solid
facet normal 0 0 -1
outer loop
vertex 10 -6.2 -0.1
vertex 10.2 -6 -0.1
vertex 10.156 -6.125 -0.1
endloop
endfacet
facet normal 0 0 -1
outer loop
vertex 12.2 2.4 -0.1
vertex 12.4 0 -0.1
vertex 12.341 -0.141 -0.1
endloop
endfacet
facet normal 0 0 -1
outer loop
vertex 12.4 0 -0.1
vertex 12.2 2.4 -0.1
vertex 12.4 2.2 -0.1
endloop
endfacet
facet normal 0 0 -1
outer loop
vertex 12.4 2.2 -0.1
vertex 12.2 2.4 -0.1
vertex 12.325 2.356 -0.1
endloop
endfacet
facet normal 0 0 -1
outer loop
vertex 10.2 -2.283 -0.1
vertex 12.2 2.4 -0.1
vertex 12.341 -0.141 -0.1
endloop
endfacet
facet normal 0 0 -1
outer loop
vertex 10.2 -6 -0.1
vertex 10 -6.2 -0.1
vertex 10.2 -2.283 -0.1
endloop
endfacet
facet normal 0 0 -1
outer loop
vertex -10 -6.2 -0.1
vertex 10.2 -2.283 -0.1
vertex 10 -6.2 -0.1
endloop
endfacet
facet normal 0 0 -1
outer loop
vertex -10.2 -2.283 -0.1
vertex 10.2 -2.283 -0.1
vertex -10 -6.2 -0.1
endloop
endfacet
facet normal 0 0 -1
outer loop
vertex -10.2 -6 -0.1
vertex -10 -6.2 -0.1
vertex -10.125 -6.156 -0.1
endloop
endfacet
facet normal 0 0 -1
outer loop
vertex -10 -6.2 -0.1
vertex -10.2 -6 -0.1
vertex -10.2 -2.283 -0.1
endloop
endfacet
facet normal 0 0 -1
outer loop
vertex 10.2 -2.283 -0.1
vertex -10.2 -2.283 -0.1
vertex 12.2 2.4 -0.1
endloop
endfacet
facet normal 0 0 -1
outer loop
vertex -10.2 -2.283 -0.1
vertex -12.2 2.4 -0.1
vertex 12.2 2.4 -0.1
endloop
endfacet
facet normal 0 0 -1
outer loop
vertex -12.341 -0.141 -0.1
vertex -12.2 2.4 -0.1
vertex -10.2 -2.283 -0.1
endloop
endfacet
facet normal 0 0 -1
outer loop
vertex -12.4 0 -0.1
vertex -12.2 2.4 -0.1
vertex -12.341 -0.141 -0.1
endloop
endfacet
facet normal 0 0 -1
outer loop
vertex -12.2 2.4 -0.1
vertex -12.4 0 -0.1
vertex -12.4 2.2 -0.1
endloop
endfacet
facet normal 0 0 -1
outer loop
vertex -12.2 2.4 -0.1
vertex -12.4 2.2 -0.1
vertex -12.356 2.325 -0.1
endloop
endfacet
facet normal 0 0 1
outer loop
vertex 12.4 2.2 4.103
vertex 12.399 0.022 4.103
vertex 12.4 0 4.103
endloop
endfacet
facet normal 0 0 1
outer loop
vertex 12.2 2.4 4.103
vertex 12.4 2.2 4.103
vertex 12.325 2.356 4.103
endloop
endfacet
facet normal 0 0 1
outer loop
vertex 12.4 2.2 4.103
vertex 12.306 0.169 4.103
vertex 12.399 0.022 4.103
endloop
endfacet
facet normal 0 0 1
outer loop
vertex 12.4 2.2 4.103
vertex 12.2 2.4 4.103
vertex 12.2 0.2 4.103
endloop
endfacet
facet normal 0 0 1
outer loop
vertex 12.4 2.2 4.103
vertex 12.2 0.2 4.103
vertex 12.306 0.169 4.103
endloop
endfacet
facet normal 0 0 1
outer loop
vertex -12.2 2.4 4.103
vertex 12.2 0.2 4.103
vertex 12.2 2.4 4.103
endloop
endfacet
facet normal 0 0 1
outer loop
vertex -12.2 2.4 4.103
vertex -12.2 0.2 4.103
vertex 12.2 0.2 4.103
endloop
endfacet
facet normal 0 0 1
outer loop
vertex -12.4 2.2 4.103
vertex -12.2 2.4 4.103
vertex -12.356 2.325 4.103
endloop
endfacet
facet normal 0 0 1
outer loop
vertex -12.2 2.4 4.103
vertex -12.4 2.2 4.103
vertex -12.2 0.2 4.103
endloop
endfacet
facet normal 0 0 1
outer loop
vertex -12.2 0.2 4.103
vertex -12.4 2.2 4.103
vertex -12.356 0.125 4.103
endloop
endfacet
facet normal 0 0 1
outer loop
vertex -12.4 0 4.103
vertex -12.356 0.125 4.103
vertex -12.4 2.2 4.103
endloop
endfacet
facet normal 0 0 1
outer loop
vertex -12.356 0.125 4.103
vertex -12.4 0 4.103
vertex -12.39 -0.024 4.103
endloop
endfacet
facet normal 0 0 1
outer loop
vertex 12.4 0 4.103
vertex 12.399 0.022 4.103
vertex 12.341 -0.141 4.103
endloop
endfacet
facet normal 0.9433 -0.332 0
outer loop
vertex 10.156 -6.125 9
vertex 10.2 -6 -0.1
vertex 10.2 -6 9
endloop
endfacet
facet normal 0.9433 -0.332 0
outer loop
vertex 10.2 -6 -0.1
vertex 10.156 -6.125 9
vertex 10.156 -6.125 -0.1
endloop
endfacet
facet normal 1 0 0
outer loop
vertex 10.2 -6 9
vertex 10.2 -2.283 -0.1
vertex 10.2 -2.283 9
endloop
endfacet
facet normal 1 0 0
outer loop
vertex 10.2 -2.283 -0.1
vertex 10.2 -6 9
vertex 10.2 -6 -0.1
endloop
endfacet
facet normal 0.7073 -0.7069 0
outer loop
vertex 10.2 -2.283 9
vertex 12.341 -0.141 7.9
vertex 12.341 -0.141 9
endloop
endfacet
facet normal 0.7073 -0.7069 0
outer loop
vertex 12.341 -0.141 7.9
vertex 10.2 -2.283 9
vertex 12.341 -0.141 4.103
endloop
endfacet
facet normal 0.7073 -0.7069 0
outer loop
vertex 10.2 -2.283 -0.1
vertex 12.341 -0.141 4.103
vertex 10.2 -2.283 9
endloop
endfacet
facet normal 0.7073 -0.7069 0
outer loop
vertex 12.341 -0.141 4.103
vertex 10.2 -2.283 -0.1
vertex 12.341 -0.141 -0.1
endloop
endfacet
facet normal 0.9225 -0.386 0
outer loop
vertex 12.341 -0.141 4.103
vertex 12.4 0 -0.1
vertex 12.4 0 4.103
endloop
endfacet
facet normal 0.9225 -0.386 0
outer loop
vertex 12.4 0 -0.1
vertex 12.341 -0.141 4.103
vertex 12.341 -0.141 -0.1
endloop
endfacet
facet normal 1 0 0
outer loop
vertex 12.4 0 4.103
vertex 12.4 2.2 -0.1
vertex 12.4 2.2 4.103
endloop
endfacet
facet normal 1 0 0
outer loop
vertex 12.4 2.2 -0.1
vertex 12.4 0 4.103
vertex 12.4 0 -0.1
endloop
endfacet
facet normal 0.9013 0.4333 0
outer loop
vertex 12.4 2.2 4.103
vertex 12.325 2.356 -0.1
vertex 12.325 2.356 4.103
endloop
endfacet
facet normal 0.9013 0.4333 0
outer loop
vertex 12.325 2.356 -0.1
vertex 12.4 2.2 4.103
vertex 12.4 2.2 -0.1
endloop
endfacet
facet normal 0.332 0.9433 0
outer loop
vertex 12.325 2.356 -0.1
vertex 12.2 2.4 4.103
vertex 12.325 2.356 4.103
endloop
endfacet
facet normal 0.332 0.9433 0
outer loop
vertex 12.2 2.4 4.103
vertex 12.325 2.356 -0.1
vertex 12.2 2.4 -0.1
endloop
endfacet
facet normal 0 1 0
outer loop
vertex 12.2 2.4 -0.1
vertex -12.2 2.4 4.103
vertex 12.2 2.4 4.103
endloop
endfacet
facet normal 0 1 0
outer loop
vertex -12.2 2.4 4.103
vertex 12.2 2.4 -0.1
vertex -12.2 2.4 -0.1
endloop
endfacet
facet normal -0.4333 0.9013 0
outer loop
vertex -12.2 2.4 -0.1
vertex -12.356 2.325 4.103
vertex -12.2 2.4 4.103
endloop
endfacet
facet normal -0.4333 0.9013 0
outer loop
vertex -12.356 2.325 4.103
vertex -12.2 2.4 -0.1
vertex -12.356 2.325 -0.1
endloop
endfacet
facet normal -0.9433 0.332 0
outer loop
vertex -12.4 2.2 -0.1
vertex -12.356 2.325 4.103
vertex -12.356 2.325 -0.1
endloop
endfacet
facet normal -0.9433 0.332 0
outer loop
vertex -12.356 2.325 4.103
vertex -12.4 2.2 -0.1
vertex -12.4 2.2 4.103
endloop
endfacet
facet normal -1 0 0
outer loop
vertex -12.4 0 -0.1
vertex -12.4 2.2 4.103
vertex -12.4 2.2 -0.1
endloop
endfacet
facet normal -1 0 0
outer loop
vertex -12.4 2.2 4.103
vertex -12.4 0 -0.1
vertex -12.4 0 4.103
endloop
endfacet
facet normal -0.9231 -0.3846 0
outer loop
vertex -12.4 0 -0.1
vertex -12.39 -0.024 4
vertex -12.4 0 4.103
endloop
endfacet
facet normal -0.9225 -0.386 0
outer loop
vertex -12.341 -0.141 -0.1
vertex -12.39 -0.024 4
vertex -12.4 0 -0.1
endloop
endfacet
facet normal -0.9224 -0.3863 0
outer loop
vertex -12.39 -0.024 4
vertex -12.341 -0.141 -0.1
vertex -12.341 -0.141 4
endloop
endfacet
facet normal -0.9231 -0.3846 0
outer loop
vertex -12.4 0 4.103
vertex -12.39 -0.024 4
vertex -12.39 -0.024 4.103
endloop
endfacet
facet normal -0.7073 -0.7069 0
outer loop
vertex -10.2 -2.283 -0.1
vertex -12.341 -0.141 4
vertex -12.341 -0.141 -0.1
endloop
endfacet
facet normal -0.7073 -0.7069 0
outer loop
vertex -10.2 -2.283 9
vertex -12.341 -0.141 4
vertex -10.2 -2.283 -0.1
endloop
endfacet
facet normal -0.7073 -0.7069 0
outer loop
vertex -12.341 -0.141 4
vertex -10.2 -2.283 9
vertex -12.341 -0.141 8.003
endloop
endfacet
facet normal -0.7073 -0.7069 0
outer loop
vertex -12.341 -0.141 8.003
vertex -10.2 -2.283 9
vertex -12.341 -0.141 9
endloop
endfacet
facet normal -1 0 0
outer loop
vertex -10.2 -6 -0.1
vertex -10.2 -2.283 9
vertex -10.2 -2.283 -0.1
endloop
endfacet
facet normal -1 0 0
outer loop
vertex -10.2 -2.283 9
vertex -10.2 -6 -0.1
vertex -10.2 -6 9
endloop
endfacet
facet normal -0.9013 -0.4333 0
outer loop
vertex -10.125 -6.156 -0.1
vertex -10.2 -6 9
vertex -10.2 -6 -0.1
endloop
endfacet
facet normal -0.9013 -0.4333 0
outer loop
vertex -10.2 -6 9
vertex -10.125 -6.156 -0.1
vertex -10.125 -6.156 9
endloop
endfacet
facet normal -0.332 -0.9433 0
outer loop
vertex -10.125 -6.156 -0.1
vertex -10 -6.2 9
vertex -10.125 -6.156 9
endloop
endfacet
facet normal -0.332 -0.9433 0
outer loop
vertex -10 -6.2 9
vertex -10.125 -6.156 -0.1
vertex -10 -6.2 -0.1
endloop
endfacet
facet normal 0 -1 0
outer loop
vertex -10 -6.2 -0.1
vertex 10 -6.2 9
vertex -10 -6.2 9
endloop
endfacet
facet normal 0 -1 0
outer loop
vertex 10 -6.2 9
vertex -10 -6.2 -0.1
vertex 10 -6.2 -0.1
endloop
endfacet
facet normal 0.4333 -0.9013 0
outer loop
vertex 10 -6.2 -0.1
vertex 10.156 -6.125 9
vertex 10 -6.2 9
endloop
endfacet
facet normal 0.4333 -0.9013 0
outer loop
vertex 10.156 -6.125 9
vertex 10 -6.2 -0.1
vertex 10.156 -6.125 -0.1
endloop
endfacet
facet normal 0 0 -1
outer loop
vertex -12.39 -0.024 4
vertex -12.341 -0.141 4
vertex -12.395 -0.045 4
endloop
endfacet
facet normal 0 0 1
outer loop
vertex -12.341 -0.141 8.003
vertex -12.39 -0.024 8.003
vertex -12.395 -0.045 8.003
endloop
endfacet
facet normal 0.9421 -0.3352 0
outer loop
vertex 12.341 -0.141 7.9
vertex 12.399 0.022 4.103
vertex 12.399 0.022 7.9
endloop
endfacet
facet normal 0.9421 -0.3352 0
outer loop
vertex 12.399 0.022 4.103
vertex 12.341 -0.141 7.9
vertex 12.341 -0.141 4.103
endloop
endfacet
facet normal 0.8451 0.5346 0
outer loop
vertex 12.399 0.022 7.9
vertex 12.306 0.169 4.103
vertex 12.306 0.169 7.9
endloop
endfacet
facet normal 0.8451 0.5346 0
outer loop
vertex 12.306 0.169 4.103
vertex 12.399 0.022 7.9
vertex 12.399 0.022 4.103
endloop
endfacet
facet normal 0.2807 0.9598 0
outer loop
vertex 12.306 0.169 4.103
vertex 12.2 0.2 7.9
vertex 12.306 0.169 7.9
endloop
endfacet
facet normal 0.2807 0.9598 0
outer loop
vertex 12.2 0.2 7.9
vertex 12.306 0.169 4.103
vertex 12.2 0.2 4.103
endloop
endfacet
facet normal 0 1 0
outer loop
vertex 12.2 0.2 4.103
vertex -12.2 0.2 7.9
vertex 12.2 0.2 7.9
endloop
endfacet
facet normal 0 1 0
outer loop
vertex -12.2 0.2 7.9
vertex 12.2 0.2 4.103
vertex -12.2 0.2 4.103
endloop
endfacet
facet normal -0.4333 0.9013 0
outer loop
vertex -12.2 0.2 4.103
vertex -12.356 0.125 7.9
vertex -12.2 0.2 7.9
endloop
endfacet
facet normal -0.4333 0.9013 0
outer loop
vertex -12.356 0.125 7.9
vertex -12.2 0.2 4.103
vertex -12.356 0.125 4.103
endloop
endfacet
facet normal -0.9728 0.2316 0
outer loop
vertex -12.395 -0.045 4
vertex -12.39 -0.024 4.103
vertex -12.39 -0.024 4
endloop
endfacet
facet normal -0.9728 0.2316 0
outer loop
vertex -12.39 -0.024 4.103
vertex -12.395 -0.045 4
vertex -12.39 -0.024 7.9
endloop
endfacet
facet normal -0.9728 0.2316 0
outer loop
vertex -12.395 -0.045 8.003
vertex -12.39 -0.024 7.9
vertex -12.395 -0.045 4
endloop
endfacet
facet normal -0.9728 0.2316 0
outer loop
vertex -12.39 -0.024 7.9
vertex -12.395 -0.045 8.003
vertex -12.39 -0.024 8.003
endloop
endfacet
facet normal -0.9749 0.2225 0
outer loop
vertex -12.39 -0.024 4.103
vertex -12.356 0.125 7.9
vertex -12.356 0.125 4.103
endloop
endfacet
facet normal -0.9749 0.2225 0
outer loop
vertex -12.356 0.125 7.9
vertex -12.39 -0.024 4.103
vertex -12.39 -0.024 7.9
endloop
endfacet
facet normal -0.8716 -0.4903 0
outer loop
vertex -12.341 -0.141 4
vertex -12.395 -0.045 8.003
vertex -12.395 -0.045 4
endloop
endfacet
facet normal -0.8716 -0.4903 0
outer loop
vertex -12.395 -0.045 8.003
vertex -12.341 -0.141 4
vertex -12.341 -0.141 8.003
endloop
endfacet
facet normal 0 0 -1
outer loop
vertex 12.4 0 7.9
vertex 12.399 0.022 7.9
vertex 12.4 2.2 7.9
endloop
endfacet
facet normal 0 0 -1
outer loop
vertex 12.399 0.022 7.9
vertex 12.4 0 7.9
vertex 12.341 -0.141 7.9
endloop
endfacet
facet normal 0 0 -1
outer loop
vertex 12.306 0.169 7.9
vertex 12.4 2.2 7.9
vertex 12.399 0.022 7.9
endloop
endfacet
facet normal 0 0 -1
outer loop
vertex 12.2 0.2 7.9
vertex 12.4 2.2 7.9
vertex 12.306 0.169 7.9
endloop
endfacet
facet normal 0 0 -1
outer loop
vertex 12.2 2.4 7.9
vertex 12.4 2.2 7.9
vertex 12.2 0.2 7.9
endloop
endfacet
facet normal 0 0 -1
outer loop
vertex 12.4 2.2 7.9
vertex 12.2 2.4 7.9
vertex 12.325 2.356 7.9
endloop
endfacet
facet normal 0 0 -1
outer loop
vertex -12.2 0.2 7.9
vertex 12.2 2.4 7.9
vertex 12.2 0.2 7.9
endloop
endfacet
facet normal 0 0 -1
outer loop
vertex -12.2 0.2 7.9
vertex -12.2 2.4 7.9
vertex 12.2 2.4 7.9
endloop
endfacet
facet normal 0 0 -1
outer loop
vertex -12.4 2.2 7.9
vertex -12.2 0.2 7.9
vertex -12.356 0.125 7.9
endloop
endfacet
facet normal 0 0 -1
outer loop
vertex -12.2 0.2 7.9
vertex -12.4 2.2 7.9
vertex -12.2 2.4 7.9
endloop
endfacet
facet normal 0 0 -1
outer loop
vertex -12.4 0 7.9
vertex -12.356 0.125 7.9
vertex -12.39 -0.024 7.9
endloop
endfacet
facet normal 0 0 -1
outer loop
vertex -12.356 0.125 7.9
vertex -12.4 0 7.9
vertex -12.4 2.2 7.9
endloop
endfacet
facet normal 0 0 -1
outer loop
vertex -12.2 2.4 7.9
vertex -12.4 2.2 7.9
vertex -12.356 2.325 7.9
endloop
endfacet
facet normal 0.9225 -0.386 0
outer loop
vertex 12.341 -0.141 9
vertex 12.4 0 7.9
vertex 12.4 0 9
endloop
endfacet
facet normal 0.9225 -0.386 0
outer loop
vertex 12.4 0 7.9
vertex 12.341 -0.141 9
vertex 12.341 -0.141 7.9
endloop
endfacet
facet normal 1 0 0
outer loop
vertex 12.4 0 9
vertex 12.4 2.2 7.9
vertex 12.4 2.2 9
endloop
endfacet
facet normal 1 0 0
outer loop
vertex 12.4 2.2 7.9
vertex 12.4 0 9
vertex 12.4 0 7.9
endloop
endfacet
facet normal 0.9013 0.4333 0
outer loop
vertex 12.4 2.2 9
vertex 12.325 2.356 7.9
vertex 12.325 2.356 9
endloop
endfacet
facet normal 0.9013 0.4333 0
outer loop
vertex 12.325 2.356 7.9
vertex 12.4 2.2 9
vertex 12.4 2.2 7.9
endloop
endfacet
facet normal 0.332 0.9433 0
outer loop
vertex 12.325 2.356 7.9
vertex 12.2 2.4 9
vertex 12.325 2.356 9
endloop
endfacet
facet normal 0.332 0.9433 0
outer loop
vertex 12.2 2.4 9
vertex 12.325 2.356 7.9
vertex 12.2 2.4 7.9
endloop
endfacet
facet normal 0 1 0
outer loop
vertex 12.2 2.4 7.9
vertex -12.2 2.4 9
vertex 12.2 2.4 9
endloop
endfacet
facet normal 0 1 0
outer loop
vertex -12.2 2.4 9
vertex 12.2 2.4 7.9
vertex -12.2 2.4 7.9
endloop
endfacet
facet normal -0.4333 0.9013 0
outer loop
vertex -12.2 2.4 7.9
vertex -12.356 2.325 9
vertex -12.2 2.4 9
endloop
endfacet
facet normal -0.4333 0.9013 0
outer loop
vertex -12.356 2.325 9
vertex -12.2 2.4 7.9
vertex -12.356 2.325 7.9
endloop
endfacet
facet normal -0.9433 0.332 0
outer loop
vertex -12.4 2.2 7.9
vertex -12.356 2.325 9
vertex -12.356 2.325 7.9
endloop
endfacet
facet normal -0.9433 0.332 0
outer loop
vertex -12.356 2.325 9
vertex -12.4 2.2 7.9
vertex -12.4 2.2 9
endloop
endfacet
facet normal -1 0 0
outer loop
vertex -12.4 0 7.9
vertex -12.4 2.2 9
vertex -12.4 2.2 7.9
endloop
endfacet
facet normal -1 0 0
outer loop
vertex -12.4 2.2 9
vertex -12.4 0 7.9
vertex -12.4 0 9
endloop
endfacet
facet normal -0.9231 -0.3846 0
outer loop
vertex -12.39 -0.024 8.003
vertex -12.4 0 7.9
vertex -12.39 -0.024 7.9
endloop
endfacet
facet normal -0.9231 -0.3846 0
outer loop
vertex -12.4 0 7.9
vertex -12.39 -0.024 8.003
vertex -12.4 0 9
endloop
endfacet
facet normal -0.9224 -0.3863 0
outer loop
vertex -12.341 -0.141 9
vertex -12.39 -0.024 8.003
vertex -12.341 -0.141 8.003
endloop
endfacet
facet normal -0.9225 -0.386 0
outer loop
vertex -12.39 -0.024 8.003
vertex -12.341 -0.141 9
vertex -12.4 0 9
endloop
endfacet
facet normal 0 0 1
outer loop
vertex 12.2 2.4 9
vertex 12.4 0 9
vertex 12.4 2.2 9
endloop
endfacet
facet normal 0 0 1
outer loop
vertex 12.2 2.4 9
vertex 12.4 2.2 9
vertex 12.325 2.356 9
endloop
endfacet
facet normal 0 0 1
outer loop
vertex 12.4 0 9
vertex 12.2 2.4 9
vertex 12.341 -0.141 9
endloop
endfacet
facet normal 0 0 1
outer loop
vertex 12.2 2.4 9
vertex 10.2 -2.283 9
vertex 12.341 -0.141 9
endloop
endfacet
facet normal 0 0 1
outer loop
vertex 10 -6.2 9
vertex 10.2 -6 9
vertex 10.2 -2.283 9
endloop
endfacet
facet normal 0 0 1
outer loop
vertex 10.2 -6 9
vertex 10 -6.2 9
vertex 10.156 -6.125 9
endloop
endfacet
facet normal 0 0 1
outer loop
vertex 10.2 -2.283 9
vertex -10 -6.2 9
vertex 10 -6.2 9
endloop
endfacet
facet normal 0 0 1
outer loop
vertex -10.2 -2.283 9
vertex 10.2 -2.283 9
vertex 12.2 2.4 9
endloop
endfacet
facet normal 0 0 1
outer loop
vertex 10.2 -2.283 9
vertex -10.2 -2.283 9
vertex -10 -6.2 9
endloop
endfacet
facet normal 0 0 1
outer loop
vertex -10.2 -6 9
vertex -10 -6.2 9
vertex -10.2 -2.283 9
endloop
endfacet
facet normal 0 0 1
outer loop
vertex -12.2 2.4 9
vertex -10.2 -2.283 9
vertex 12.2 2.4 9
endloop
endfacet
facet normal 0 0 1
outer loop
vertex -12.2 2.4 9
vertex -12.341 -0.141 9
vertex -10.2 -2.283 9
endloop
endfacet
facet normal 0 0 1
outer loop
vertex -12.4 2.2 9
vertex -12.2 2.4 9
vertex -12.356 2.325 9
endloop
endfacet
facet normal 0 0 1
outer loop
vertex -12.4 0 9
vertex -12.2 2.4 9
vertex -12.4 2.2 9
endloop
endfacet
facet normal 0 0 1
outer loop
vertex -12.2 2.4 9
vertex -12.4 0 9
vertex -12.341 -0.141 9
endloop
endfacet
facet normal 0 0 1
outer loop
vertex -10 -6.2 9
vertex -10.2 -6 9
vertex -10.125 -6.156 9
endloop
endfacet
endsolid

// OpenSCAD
// file: common.scad
$fa = 10;
$fs = 0.2;
eps = 0.003;
$zstep = 0.2;

// An inward chamfer sufficient to prevent elephant's foot.
foot = 0.4;

// FINDINGS FROM CLEARANCE TEST
//
// Consider a vertical hole of width X, a layer height of 0.2, and a vertical
// post.
//   * A post of diameter X will not fit in.
//   * A post of diameter X-0.1 will fit in, but is very hard to slide in or out.
//     This is probably due mostly to the transverse grain of the print.
//     It will rotate, but with some resistance.
//   * A post of diameter X-0.2 slides in and out easily. It rotates easily, but
//     still has noticeable resistance at some points.
//   * A post of diameter X-0.3 rotates freely. It also has noticeable play
//     from side to side.
//
// Clearances are expressed as the total across both sides of a joint.
tight = 0.1;  // Intended for stationary joints.
snug = 0.2;   // Moves, but with some resistance.
loose = 0.3;  // Free movement.
extra_loose = 0.4;

// A brim is a 0.2mm layer printed near an edge which is likely to warp.
// The edge should be chamfered outwards at 45 degrees. The brim should
// be placed this far from the bottom of the edge, so it barely touches
// the chamfer.
brim_offset = 0.3;

// Menards 5/8 x 2-3/4 x 0.04 WG compression spring.
spring_od = 5/8 * 25.4;
// Subtract 10 from the relaxed length so everything is slightly tensioned
// all the time.
spring_max_length = 2.75 * 25.4 - 10;
spring_min_length = 16;  // Approximate.

// Menards 1/4 inch aluminum rod.
roller_diameter = 6.7;
roller_cavity_diameter = roller_diameter + loose;

// 550 paracord. Make this wide enough to accommodate a melted end.
string_diameter = 4.5;

// Standard spring tube.
tube_id = spring_od + 0.7;

module octagon(diameter) {
  intersection_for(a = [0, 45])
    rotate([0, 0, a])
      square(diameter, center=true);
}

// A cylinder with a chamfered or flared bottom end, useful for dealing
// with elephant's foot on pins or holes.
module flare_cylinder(height, radius, flare) {
  translate([0, 0, abs(flare)-eps])
    cylinder(height-abs(flare)+eps, radius, radius);

  linear_extrude(abs(flare), scale=radius/(radius-flare))
    circle(radius-flare);
}

// A cube with a chamfered or flared bottom end, useful for dealing
// with elephant's foot on pins or holes.
module flare_cube(dims, flare) {
  translate([0, 0, abs(flare)-eps])
    cube([dims.x, dims.y, dims.z - abs(flare) + eps]);

  translate([dims.x/2, dims.y/2, 0])
    linear_extrude(abs(flare), scale=[dims.x/(dims.x-2*flare), dims.y/(dims.y-2*flare)])
      translate([-(dims.x-2*flare)/2, -(dims.y-2*flare)/2, abs(flare)-eps])
        square([dims.x-2*flare, dims.y-2*flare]);
}

// An approximate circle which can be printed on its side.
module circle_ish(r) {
  // Safe overhang angle.
  q = 45;
  
  intersection() {
    // Add 0.2 (one print layer) in case the bridge is messy and hangs
    // down.
    square(2*r+0.2, center=true);
    hull() {
      circle(r);
      for (a = [-1, 1])
        translate([0, a*r/cos(q), 0])
          square(eps, center=true);
    }
  }
}

// Depth of the sockets used as glue aids.
socket_depth = 5;

module socket() {
  translate([-1.5, -1.5, -eps])
    flare_cube([3, 3, socket_depth], -foot);
}

module lug() {
  flare_cube([3-snug, 3-snug, 2*socket_depth-2], foot);
}

// Nerf darts are 0.50 cal.
dart_diameter = 12.7;
dart_length = 72;

module octahedron(major_radius=1) {
  // Top and bottom halves.
  for (a = [-1, 1])
    scale([1, 1, a])
      // Extrude a square into a pyramid.
      linear_extrude(major_radius, scale=0)
        rotate([0, 0, 45])
          square(sqrt(2)*major_radius, center=true);
}

module chamfered_cube(dims, chamfer=1) {
  assert(dims.x >= 2*chamfer);
  assert(dims.y >= 2*chamfer);
  assert(dims.z >= 2*chamfer);

  hull()
    for (a = [0, 1], b = [0, 1], c = [0, 1])
        translate([
          (dims.x - 2*chamfer) * a + chamfer,
          (dims.y - 2*chamfer) * b + chamfer,
          (dims.z - 2*chamfer) * c + chamfer
        ])
          octahedron(chamfer);
}
// main file
include <common.scad>

notch_depth = 2.2;
notch_length = 4;

// lug_type 0 means no lug. 1 means beveled. 2 means square.
module rail_lug_2d(width, stem, lug_type) {
  translate([0, -stem/2, 0])
    square([width, stem], center=true);
  
  difference() {
    hull()
      for (a = [-1, 1])
        scale([a, 1, 1])
          translate([width/2, 0, 0])
            rotate([0, 0, 45])
              square(notch_depth*sqrt(2), center=true);
    
    if (lug_type == 0)
      translate([0, notch_depth])
        square([width+notch_depth*4, notch_depth*2], center=true);
  }
  
  if (lug_type == 2)
    translate([0, notch_depth/2, 0])
      square([width + notch_depth*2, notch_depth], center=true);
}

module rail(width, length, stem, cavity=false) {
  repeats = floor(length / (2*notch_length));
  
  intersection() {
    cube([width*2, width*2, length*2], center=true);
    
    for (a = [0:repeats]) {
      translate([0, 0, a*2*notch_length]) {
        difference() {
          // High piece.
          translate([0, 0, cavity ? -snug/2 : 0])
            linear_extrude(notch_length+eps + (cavity ? snug : 0))
              offset(cavity ? snug : 0)
                rail_lug_2d(width, stem, cavity ? 2 : 1);

          // Chamfer edges.
          if (!cavity)
            for (z = [0, notch_length])
              translate([0, notch_depth, z])
                hull()
                  rotate([45, 0, 0])
                    cube([width*2, foot*sqrt(2), foot*sqrt(2)], center=true);
        }

        // Low piece.
        translate([0, 0, notch_length])
          linear_extrude(notch_length+eps)
            offset(cavity ? snug : 0)
              rail_lug_2d(width, stem, 0);      
      }
    }
  }
}

rail(20, 9, 6, cavity=true);
